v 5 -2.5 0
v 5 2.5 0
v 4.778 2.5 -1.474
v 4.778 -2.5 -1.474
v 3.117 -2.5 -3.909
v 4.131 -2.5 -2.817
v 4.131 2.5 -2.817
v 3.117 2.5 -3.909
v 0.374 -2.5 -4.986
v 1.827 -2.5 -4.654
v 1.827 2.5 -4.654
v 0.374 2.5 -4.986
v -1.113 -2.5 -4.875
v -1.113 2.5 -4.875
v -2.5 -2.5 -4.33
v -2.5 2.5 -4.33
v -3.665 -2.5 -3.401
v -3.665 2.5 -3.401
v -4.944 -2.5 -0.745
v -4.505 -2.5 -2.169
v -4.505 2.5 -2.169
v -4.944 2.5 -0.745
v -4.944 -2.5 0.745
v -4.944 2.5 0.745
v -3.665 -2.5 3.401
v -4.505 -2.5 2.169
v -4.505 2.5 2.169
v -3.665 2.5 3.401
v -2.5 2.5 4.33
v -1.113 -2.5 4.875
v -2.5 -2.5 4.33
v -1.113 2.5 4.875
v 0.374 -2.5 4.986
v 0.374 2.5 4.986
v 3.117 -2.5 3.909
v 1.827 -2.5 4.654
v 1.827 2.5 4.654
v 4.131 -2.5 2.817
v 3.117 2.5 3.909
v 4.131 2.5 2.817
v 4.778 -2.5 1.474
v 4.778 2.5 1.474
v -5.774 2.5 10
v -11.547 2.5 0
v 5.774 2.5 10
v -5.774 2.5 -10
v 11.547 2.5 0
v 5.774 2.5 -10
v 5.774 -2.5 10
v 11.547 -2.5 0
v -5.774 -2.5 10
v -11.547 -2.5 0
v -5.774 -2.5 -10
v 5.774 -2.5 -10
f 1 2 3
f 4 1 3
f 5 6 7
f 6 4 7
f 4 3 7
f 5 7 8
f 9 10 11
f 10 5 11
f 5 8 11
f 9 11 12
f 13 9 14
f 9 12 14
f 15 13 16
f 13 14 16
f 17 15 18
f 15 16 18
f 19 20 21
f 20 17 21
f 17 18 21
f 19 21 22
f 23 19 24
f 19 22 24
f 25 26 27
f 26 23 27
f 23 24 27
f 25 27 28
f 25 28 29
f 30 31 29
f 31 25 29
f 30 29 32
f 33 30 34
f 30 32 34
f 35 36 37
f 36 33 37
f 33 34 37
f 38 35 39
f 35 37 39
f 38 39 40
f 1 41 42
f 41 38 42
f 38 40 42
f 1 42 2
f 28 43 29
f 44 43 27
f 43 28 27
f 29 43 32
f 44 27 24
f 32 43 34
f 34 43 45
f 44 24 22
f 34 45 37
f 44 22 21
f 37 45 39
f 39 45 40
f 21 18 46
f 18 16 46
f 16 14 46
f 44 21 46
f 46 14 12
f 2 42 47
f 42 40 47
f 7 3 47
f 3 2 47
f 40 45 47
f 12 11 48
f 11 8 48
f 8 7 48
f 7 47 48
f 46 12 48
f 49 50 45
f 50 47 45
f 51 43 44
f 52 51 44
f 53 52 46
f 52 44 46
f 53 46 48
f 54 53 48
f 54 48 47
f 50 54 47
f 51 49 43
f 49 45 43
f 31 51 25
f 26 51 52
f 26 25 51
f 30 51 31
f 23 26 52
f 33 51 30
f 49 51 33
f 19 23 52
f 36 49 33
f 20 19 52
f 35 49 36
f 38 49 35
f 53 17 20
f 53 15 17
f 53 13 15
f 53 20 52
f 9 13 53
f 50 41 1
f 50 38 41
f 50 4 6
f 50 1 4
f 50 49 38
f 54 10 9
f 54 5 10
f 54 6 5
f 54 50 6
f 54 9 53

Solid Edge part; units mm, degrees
sketch "Sketch1" plane through (0, 0, 0) normal (0, -1, 0) x (1, 0, 0)
  line L0 (5.7735, 10) -> (-5.7735, 10)
  line L1 (-5.7735, 10) -> (-11.547, 0)
  line L2 (-11.547, 0) -> (-5.7735, -10)
  line L3 (-5.7735, -10) -> (5.7735, -10)
  line L4 (5.7735, -10) -> (11.547, 0)
  line L5 (11.547, 0) -> (5.7735, 10)
  circle A0 centre (0, 0) radius 5
extrude "Protrusion1" add sketch "Sketch1" along normal mid plane 5
